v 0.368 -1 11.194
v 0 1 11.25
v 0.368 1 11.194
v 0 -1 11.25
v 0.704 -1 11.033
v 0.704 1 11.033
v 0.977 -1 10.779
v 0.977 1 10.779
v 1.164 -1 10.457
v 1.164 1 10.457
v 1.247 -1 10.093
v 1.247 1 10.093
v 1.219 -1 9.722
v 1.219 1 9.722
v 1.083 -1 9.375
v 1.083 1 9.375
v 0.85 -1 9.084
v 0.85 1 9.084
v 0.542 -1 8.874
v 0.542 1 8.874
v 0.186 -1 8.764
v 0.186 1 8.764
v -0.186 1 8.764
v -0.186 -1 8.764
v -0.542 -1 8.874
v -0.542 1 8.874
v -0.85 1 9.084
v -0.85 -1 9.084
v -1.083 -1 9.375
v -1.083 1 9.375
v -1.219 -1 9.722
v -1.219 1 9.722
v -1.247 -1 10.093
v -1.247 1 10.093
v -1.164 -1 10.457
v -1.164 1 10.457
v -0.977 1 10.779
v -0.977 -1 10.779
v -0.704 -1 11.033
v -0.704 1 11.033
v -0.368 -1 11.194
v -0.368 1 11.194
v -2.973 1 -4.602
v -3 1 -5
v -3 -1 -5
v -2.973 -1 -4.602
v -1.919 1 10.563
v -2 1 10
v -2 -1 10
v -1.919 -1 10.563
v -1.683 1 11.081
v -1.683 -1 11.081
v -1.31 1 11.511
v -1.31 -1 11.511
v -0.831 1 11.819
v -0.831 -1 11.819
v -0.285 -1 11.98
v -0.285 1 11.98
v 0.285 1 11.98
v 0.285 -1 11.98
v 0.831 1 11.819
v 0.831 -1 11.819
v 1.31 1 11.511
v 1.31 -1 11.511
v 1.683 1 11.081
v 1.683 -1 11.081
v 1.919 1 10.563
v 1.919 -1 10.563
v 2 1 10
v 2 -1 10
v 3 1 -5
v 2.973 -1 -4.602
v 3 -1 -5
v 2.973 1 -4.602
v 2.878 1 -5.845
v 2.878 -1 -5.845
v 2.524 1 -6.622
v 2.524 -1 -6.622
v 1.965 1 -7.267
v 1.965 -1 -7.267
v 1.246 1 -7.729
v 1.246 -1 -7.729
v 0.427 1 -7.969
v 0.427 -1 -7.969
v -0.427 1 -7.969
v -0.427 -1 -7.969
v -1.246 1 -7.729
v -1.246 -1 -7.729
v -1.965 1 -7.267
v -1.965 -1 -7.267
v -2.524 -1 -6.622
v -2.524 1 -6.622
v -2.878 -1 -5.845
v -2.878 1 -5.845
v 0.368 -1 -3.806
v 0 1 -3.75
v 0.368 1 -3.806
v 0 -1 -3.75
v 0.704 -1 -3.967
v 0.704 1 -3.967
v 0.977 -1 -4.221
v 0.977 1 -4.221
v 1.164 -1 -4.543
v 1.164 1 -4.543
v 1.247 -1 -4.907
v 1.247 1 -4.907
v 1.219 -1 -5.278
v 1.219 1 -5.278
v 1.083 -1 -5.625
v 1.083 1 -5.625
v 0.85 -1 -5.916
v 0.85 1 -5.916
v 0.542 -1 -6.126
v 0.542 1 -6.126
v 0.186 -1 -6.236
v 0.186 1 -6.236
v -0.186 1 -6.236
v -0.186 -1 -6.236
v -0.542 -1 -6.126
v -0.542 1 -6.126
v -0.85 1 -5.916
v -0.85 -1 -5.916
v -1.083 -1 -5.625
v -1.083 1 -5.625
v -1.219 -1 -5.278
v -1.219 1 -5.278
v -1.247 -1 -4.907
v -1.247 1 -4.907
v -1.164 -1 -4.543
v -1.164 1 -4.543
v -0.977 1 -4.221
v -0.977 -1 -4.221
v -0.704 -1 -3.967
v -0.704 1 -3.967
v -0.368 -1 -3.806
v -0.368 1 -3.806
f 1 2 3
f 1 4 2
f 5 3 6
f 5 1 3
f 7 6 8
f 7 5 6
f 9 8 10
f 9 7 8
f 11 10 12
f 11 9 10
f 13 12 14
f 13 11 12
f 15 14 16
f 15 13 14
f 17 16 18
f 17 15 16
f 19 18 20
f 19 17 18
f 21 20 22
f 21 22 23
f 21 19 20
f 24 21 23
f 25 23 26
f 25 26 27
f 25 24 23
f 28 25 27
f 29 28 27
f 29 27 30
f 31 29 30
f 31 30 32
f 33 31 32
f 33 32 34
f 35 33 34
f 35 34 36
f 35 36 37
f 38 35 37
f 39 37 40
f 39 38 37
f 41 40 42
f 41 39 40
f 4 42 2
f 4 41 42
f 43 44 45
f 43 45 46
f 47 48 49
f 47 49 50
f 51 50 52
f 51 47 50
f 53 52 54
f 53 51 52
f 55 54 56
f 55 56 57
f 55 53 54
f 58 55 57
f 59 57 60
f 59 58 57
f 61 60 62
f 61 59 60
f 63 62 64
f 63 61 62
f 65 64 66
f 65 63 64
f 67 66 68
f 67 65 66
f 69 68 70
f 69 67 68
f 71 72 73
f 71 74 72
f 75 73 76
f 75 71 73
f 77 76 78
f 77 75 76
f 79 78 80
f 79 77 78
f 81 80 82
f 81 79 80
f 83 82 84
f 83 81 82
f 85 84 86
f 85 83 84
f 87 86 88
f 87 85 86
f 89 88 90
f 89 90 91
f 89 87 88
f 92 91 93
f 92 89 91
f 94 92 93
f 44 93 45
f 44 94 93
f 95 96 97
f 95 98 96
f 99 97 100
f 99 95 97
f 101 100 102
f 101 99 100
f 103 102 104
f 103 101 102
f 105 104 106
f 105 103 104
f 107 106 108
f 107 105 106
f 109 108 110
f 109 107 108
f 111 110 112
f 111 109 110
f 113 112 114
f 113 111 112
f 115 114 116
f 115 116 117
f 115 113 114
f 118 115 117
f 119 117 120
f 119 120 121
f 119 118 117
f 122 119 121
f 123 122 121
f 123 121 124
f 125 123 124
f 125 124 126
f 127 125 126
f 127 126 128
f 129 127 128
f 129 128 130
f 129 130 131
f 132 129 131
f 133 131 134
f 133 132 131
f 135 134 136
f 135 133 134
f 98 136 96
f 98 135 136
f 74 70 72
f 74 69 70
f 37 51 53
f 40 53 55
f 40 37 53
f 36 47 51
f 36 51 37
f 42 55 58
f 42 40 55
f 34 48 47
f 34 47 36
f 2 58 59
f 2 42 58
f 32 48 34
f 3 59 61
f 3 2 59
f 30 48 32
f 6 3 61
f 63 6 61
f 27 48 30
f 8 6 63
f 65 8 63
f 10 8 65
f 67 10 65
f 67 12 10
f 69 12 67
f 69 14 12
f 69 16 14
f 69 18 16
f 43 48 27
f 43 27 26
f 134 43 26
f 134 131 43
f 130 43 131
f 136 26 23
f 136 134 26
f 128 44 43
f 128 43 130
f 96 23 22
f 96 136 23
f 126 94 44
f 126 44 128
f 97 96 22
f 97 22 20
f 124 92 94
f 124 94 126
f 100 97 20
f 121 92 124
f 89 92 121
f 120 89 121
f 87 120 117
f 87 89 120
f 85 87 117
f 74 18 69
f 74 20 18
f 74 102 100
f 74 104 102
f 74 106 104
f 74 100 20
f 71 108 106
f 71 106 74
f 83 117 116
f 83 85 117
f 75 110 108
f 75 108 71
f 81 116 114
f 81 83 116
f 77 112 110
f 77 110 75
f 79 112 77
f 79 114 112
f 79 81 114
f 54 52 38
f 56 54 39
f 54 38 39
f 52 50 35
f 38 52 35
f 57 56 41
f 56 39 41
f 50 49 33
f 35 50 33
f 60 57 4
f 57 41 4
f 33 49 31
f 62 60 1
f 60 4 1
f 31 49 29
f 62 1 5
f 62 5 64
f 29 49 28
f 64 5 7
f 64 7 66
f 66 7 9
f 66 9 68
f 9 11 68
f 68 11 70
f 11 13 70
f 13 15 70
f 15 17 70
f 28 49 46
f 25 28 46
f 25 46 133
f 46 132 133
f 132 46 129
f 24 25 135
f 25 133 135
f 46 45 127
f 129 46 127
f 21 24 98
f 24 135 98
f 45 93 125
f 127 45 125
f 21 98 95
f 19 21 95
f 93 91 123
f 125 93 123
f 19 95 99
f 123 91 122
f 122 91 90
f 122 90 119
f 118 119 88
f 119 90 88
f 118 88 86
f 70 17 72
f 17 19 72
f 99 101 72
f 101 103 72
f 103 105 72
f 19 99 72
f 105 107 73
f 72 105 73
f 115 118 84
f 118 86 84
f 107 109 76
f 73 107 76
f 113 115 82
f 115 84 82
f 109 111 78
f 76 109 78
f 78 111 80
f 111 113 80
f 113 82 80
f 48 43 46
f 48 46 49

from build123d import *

# Parameters (mm, degrees)
SKETCH1_R           = 1.25
BOSS_EXTRUDE1_DEPTH = 1


with BuildPart() as part:
    # Sketch1 → Boss-Extrude1 (new, symmetric)
    with BuildSketch(Plane(origin=(0, 0, 0), x_dir=(1, 0, 0), z_dir=(0, 1, 0))):
        with BuildLine():
            ThreePointArc((3, 5), (0, 8), (-3, 5))
            Line((-3, 5), (-2.973451327, 4.601769912))
            Line((-2.973451327, 4.601769912), (-2, -10))
            ThreePointArc((-2, -10), (0, -12), (2, -10))
            Line((2, -10), (2.973451327, 4.601769912))
            Line((2.973451327, 4.601769912), (3, 5))
        make_face()
        with Locations(Location((0, -10, 0), (0, 0, 270))):
            Circle(SKETCH1_R, mode=Mode.SUBTRACT)
        with Locations(Location((0, 5, 0), (0, 0, 270))):
            Circle(SKETCH1_R, mode=Mode.SUBTRACT)
    extrude(amount=BOSS_EXTRUDE1_DEPTH, both=True)


solid = part.part
